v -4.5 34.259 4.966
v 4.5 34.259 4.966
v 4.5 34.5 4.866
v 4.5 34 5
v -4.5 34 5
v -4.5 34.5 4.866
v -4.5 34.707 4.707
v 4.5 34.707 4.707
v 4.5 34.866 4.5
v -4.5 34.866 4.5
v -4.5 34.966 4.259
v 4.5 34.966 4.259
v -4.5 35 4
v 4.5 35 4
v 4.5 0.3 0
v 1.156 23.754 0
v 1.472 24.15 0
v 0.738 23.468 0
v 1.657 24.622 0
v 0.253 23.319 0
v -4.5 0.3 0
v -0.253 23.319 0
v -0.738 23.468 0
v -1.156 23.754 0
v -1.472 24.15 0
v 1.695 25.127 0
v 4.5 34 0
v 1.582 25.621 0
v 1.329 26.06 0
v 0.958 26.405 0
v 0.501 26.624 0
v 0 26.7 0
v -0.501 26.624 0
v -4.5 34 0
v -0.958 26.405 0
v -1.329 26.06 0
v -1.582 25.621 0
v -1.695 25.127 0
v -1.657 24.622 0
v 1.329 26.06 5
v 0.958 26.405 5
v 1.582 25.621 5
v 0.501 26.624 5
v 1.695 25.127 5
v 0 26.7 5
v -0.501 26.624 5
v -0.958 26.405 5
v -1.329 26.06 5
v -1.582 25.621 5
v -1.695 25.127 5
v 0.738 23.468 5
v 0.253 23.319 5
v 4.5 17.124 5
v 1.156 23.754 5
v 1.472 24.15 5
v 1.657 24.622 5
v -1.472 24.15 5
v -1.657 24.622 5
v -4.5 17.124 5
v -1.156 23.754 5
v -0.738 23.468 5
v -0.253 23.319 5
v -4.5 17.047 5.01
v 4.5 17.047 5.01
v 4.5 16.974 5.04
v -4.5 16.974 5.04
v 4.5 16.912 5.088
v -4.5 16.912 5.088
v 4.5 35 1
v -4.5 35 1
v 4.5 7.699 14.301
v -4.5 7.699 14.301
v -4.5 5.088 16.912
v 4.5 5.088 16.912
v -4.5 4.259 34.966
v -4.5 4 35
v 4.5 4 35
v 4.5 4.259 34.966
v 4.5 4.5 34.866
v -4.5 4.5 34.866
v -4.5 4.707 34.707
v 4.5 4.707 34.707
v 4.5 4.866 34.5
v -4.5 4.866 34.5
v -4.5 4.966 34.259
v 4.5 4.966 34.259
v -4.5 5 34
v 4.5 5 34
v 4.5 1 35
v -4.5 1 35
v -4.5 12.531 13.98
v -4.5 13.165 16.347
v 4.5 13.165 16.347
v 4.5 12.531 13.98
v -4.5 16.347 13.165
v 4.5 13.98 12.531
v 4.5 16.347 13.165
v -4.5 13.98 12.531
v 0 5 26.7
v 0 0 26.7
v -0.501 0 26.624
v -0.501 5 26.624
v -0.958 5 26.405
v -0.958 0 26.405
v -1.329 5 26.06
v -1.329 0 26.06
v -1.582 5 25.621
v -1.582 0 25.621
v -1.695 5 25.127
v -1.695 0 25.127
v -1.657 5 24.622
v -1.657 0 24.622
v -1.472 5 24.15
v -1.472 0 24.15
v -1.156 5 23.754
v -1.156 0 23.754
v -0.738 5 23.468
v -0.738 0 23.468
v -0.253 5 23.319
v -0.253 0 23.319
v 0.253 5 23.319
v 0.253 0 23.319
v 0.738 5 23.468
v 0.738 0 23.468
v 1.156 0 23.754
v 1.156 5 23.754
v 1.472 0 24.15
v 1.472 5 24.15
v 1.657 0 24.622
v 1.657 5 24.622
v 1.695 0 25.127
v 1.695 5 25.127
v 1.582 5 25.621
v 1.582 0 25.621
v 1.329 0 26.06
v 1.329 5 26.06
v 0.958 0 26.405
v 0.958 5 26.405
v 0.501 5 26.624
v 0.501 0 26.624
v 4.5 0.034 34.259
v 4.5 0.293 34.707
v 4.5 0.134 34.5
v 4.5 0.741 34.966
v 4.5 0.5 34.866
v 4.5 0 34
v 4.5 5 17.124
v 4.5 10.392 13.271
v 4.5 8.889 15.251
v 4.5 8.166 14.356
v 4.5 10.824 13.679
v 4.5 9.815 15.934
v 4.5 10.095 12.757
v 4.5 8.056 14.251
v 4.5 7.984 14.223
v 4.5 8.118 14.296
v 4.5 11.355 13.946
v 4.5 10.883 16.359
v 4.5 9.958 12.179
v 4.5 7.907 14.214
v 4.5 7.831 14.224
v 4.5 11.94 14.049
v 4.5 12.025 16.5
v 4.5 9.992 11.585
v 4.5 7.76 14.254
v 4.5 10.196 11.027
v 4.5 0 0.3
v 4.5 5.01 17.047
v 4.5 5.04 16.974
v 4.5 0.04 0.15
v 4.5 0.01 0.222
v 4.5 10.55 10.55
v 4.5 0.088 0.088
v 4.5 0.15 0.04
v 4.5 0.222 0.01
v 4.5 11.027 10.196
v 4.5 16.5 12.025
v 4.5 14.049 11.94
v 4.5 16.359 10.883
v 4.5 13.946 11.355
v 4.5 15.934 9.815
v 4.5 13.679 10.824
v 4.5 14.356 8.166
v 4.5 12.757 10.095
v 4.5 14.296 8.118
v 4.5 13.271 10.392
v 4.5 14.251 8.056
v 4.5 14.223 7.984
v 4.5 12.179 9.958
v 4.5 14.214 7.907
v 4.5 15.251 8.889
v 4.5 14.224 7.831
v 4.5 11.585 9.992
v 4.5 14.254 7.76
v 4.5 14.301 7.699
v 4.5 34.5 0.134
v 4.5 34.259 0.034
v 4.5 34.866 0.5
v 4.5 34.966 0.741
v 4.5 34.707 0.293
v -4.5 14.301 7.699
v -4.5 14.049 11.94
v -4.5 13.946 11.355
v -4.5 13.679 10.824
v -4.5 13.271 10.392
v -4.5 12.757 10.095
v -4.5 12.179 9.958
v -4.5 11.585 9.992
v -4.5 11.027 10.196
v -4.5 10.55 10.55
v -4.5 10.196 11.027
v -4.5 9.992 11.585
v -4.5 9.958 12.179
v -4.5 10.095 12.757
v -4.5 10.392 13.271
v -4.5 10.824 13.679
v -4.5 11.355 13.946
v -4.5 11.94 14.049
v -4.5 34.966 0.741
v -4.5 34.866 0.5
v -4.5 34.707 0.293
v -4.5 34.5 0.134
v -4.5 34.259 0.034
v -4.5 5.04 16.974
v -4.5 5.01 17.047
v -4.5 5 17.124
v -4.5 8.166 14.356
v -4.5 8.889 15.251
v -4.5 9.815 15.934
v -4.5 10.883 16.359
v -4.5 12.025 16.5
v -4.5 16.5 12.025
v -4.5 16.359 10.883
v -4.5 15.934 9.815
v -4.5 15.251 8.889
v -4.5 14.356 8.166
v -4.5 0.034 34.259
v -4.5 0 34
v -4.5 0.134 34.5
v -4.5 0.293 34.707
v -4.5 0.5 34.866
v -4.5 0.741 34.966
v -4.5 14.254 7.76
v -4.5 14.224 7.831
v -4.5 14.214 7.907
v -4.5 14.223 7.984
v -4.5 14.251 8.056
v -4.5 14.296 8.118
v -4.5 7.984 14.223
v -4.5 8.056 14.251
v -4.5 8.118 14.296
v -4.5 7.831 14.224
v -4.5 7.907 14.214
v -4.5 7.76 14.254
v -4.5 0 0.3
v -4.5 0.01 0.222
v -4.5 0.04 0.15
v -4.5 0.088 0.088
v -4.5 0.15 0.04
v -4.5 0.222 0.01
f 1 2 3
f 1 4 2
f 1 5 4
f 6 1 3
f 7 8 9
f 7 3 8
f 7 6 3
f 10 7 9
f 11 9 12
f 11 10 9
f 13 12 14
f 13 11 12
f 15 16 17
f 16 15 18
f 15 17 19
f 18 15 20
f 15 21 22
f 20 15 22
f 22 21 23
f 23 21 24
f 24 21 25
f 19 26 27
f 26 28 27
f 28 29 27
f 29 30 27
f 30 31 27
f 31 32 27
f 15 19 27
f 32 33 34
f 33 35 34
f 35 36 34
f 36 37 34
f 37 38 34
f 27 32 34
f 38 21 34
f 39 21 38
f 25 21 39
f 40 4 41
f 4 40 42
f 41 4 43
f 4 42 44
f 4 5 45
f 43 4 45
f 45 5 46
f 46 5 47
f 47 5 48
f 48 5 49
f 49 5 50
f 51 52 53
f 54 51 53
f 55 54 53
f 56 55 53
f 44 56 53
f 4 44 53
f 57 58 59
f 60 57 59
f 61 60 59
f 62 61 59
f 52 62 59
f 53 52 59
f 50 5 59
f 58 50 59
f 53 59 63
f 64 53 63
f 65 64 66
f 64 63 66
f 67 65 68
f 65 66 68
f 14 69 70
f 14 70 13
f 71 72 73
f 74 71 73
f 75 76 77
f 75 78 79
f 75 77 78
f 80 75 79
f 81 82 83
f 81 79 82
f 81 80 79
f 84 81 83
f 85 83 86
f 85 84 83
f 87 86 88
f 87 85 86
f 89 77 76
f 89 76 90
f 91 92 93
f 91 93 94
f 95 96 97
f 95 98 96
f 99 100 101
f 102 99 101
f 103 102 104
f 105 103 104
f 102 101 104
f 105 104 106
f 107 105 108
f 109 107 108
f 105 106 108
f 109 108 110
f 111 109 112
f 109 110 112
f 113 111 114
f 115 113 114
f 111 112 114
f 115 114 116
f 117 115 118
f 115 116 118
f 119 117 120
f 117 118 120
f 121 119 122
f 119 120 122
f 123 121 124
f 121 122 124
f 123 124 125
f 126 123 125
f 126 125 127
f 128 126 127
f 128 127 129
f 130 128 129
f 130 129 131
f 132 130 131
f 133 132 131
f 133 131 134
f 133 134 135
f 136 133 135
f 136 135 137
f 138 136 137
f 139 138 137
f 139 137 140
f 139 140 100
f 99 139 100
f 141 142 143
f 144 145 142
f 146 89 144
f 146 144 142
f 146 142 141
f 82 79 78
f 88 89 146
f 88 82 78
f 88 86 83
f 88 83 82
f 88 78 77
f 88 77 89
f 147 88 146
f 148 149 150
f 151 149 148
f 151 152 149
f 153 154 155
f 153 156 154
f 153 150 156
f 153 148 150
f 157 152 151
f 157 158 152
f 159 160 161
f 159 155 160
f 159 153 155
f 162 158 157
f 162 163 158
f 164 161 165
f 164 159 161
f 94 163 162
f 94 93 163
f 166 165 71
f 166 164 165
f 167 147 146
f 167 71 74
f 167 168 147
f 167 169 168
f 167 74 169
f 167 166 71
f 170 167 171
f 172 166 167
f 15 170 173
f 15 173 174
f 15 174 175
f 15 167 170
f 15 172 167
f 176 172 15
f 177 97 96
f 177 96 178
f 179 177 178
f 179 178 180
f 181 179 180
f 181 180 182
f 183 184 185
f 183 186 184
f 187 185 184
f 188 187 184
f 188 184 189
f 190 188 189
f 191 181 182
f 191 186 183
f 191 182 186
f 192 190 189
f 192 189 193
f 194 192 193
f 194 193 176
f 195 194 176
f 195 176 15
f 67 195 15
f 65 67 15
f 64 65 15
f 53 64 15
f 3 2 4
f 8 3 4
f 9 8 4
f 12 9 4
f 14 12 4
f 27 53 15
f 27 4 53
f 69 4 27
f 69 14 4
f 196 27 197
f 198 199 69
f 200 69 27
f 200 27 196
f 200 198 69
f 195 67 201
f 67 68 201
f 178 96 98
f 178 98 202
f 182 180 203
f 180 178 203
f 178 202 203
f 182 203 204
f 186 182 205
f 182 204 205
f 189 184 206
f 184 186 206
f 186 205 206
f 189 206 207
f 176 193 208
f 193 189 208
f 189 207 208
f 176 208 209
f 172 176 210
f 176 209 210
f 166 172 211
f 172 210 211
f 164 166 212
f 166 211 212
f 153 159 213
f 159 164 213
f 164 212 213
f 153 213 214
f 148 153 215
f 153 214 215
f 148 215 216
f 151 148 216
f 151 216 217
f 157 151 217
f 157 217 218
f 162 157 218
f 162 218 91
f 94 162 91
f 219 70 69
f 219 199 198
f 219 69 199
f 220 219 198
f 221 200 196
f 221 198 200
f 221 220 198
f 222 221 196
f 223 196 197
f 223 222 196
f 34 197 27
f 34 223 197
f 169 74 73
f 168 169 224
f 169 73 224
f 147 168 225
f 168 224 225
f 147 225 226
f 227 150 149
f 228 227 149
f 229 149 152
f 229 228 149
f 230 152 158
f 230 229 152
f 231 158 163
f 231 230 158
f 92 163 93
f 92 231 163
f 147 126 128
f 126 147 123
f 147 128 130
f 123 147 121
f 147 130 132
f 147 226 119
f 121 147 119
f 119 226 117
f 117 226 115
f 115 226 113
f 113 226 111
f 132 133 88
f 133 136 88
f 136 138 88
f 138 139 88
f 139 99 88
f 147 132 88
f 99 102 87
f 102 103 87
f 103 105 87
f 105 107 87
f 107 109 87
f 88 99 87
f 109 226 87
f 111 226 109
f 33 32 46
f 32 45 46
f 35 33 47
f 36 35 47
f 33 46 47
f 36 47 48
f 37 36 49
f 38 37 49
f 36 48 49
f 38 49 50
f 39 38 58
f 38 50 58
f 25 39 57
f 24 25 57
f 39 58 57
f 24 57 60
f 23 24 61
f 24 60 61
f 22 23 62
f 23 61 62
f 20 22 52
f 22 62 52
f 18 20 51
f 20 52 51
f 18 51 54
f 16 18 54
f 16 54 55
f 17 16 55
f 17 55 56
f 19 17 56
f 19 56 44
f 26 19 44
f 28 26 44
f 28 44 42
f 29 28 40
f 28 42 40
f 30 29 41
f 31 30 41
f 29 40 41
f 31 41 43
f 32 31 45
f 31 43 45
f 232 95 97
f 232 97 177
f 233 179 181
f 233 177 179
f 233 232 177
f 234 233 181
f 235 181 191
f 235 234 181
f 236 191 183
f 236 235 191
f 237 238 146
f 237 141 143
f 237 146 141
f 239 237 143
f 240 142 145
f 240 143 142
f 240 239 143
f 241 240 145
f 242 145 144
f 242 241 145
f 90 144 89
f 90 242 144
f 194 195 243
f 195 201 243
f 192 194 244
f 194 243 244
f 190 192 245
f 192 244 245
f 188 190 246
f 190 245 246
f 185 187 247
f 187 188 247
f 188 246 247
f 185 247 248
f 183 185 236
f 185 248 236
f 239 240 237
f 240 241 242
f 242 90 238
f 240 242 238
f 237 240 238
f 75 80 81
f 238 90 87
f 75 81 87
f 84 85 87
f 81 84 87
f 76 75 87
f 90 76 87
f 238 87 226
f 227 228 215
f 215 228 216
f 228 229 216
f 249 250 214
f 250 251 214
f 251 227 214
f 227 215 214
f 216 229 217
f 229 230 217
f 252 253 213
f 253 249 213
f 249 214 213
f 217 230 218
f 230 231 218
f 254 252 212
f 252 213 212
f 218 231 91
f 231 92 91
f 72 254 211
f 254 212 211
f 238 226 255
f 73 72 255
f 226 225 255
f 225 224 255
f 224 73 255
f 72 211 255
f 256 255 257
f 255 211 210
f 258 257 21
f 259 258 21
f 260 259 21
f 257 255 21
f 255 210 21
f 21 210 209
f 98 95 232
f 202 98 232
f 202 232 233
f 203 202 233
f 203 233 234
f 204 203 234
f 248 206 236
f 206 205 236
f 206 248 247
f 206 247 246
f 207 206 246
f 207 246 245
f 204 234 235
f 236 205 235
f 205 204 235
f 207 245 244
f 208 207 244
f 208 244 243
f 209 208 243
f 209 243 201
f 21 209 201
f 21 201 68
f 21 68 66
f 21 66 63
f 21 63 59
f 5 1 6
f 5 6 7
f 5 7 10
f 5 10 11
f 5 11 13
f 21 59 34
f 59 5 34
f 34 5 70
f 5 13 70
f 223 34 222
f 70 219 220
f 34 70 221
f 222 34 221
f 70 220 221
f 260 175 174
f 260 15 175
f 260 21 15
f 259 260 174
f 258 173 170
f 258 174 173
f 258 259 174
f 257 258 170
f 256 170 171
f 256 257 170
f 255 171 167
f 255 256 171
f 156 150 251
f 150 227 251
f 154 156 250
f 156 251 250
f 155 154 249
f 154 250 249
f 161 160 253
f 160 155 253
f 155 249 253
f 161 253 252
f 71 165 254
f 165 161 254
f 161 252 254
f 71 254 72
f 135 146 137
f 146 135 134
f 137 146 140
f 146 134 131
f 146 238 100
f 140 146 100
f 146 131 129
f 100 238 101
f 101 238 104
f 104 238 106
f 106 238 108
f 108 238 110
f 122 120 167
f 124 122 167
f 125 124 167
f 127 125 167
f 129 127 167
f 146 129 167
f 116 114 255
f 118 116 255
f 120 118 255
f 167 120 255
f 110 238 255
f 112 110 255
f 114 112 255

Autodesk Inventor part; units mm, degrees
ref_plane "YZ Plane" through (0, 0, 0) normal (1, 0, 0) x (0, 1, 0)
ref_plane "XZ Plane" through (0, 0, 0) normal (0, 1, 0) x (-1, 0, 0)
ref_plane "XY Plane" through (0, 0, 0) normal (0, 0, 1) x (1, 0, 0)
sketch "_____1" plane through (0, 0, 0) normal (1, 0, 0) x (0, 0, -1)
  arc A0 (-35, 1) -> (-34, 0) centre (-34, 1) ccw
  line L0 (-34, 0) -> (-0.3, 0)
  arc A1 (-0.3, 0) -> (0, 0.3) centre (-0.3, 0.3) ccw
  line L1 (0, 0.3) -> (0, 34)
  arc A2 (0, 34) -> (-1, 35) centre (-1, 34) ccw
  line L2 (-1, 35) -> (-4, 35)
  arc A3 (-4, 35) -> (-5, 34) centre (-4, 34) ccw
  line L3 (-5, 34) -> (-5, 17.1243)
  arc A4 (-5.0879, 16.9121) -> (-5, 17.1243) centre (-5.3, 17.1243) ccw
  line L4 (-5.0879, 16.9121) -> (-7.6986, 14.3014)
  arc A5 (-8.1663, 14.3564) -> (-7.6986, 14.3014) centre (-7.9107, 14.5135) ccw
  arc A6 (-8.1663, 14.3564) -> (-14.3564, 8.1663) centre (-12, 12) ccw
  arc A7 (-14.3014, 7.6986) -> (-14.3564, 8.1663) centre (-14.5135, 7.9107) ccw
  line L5 (-14.3014, 7.6986) -> (-16.9121, 5.0879)
  arc A8 (-17.1243, 5) -> (-16.9121, 5.0879) centre (-17.1243, 5.3) ccw
  line L6 (-17.1243, 5) -> (-34, 5)
  arc A9 (-34, 5) -> (-35, 4) centre (-34, 4) ccw
  line L7 (-35, 4) -> (-35, 1)
extrude "Extrusion1" add sketch "_____1" along normal mid plane 9
sketch "_____2" plane through (0, 0, 0) normal (1, 0, 0) x (0, 0, -1)
  line L0 (-16.8296, 13.2941) -> (-13.9801, 12.5306)
  arc A0 (-13.9801, 12.5306) -> (-12.5306, 13.9801) centre (-12, 12) ccw
  line L1 (-12.5306, 13.9801) -> (-13.2941, 16.8296)
  arc A1 (-13.2941, 16.8296) -> (-16.8296, 13.2941) centre (-12, 12) ccw
extrude "Extrusion2" cut sketch "_____2" along normal mid plane 9
sketch "Sketch3" plane through (4.5, 34, 0) normal (0, 0, -1) x (-1, 0, 0)
  point P0 (4.5, -9)
hole "Hole1" at (0, 25, 0) direction (0, 0, 1) diameter 3.4 depth 5
sketch "Sketch4" plane through (-4.5, 5, 34) normal (0, 1, 0) x (1, 0, 0)
  point P0 (4.5, 9)
hole "Hole2" at (0, 5, 25) direction (0, -1, 0) diameter 3.4 depth 5
properties part number "HBLTBS3"
